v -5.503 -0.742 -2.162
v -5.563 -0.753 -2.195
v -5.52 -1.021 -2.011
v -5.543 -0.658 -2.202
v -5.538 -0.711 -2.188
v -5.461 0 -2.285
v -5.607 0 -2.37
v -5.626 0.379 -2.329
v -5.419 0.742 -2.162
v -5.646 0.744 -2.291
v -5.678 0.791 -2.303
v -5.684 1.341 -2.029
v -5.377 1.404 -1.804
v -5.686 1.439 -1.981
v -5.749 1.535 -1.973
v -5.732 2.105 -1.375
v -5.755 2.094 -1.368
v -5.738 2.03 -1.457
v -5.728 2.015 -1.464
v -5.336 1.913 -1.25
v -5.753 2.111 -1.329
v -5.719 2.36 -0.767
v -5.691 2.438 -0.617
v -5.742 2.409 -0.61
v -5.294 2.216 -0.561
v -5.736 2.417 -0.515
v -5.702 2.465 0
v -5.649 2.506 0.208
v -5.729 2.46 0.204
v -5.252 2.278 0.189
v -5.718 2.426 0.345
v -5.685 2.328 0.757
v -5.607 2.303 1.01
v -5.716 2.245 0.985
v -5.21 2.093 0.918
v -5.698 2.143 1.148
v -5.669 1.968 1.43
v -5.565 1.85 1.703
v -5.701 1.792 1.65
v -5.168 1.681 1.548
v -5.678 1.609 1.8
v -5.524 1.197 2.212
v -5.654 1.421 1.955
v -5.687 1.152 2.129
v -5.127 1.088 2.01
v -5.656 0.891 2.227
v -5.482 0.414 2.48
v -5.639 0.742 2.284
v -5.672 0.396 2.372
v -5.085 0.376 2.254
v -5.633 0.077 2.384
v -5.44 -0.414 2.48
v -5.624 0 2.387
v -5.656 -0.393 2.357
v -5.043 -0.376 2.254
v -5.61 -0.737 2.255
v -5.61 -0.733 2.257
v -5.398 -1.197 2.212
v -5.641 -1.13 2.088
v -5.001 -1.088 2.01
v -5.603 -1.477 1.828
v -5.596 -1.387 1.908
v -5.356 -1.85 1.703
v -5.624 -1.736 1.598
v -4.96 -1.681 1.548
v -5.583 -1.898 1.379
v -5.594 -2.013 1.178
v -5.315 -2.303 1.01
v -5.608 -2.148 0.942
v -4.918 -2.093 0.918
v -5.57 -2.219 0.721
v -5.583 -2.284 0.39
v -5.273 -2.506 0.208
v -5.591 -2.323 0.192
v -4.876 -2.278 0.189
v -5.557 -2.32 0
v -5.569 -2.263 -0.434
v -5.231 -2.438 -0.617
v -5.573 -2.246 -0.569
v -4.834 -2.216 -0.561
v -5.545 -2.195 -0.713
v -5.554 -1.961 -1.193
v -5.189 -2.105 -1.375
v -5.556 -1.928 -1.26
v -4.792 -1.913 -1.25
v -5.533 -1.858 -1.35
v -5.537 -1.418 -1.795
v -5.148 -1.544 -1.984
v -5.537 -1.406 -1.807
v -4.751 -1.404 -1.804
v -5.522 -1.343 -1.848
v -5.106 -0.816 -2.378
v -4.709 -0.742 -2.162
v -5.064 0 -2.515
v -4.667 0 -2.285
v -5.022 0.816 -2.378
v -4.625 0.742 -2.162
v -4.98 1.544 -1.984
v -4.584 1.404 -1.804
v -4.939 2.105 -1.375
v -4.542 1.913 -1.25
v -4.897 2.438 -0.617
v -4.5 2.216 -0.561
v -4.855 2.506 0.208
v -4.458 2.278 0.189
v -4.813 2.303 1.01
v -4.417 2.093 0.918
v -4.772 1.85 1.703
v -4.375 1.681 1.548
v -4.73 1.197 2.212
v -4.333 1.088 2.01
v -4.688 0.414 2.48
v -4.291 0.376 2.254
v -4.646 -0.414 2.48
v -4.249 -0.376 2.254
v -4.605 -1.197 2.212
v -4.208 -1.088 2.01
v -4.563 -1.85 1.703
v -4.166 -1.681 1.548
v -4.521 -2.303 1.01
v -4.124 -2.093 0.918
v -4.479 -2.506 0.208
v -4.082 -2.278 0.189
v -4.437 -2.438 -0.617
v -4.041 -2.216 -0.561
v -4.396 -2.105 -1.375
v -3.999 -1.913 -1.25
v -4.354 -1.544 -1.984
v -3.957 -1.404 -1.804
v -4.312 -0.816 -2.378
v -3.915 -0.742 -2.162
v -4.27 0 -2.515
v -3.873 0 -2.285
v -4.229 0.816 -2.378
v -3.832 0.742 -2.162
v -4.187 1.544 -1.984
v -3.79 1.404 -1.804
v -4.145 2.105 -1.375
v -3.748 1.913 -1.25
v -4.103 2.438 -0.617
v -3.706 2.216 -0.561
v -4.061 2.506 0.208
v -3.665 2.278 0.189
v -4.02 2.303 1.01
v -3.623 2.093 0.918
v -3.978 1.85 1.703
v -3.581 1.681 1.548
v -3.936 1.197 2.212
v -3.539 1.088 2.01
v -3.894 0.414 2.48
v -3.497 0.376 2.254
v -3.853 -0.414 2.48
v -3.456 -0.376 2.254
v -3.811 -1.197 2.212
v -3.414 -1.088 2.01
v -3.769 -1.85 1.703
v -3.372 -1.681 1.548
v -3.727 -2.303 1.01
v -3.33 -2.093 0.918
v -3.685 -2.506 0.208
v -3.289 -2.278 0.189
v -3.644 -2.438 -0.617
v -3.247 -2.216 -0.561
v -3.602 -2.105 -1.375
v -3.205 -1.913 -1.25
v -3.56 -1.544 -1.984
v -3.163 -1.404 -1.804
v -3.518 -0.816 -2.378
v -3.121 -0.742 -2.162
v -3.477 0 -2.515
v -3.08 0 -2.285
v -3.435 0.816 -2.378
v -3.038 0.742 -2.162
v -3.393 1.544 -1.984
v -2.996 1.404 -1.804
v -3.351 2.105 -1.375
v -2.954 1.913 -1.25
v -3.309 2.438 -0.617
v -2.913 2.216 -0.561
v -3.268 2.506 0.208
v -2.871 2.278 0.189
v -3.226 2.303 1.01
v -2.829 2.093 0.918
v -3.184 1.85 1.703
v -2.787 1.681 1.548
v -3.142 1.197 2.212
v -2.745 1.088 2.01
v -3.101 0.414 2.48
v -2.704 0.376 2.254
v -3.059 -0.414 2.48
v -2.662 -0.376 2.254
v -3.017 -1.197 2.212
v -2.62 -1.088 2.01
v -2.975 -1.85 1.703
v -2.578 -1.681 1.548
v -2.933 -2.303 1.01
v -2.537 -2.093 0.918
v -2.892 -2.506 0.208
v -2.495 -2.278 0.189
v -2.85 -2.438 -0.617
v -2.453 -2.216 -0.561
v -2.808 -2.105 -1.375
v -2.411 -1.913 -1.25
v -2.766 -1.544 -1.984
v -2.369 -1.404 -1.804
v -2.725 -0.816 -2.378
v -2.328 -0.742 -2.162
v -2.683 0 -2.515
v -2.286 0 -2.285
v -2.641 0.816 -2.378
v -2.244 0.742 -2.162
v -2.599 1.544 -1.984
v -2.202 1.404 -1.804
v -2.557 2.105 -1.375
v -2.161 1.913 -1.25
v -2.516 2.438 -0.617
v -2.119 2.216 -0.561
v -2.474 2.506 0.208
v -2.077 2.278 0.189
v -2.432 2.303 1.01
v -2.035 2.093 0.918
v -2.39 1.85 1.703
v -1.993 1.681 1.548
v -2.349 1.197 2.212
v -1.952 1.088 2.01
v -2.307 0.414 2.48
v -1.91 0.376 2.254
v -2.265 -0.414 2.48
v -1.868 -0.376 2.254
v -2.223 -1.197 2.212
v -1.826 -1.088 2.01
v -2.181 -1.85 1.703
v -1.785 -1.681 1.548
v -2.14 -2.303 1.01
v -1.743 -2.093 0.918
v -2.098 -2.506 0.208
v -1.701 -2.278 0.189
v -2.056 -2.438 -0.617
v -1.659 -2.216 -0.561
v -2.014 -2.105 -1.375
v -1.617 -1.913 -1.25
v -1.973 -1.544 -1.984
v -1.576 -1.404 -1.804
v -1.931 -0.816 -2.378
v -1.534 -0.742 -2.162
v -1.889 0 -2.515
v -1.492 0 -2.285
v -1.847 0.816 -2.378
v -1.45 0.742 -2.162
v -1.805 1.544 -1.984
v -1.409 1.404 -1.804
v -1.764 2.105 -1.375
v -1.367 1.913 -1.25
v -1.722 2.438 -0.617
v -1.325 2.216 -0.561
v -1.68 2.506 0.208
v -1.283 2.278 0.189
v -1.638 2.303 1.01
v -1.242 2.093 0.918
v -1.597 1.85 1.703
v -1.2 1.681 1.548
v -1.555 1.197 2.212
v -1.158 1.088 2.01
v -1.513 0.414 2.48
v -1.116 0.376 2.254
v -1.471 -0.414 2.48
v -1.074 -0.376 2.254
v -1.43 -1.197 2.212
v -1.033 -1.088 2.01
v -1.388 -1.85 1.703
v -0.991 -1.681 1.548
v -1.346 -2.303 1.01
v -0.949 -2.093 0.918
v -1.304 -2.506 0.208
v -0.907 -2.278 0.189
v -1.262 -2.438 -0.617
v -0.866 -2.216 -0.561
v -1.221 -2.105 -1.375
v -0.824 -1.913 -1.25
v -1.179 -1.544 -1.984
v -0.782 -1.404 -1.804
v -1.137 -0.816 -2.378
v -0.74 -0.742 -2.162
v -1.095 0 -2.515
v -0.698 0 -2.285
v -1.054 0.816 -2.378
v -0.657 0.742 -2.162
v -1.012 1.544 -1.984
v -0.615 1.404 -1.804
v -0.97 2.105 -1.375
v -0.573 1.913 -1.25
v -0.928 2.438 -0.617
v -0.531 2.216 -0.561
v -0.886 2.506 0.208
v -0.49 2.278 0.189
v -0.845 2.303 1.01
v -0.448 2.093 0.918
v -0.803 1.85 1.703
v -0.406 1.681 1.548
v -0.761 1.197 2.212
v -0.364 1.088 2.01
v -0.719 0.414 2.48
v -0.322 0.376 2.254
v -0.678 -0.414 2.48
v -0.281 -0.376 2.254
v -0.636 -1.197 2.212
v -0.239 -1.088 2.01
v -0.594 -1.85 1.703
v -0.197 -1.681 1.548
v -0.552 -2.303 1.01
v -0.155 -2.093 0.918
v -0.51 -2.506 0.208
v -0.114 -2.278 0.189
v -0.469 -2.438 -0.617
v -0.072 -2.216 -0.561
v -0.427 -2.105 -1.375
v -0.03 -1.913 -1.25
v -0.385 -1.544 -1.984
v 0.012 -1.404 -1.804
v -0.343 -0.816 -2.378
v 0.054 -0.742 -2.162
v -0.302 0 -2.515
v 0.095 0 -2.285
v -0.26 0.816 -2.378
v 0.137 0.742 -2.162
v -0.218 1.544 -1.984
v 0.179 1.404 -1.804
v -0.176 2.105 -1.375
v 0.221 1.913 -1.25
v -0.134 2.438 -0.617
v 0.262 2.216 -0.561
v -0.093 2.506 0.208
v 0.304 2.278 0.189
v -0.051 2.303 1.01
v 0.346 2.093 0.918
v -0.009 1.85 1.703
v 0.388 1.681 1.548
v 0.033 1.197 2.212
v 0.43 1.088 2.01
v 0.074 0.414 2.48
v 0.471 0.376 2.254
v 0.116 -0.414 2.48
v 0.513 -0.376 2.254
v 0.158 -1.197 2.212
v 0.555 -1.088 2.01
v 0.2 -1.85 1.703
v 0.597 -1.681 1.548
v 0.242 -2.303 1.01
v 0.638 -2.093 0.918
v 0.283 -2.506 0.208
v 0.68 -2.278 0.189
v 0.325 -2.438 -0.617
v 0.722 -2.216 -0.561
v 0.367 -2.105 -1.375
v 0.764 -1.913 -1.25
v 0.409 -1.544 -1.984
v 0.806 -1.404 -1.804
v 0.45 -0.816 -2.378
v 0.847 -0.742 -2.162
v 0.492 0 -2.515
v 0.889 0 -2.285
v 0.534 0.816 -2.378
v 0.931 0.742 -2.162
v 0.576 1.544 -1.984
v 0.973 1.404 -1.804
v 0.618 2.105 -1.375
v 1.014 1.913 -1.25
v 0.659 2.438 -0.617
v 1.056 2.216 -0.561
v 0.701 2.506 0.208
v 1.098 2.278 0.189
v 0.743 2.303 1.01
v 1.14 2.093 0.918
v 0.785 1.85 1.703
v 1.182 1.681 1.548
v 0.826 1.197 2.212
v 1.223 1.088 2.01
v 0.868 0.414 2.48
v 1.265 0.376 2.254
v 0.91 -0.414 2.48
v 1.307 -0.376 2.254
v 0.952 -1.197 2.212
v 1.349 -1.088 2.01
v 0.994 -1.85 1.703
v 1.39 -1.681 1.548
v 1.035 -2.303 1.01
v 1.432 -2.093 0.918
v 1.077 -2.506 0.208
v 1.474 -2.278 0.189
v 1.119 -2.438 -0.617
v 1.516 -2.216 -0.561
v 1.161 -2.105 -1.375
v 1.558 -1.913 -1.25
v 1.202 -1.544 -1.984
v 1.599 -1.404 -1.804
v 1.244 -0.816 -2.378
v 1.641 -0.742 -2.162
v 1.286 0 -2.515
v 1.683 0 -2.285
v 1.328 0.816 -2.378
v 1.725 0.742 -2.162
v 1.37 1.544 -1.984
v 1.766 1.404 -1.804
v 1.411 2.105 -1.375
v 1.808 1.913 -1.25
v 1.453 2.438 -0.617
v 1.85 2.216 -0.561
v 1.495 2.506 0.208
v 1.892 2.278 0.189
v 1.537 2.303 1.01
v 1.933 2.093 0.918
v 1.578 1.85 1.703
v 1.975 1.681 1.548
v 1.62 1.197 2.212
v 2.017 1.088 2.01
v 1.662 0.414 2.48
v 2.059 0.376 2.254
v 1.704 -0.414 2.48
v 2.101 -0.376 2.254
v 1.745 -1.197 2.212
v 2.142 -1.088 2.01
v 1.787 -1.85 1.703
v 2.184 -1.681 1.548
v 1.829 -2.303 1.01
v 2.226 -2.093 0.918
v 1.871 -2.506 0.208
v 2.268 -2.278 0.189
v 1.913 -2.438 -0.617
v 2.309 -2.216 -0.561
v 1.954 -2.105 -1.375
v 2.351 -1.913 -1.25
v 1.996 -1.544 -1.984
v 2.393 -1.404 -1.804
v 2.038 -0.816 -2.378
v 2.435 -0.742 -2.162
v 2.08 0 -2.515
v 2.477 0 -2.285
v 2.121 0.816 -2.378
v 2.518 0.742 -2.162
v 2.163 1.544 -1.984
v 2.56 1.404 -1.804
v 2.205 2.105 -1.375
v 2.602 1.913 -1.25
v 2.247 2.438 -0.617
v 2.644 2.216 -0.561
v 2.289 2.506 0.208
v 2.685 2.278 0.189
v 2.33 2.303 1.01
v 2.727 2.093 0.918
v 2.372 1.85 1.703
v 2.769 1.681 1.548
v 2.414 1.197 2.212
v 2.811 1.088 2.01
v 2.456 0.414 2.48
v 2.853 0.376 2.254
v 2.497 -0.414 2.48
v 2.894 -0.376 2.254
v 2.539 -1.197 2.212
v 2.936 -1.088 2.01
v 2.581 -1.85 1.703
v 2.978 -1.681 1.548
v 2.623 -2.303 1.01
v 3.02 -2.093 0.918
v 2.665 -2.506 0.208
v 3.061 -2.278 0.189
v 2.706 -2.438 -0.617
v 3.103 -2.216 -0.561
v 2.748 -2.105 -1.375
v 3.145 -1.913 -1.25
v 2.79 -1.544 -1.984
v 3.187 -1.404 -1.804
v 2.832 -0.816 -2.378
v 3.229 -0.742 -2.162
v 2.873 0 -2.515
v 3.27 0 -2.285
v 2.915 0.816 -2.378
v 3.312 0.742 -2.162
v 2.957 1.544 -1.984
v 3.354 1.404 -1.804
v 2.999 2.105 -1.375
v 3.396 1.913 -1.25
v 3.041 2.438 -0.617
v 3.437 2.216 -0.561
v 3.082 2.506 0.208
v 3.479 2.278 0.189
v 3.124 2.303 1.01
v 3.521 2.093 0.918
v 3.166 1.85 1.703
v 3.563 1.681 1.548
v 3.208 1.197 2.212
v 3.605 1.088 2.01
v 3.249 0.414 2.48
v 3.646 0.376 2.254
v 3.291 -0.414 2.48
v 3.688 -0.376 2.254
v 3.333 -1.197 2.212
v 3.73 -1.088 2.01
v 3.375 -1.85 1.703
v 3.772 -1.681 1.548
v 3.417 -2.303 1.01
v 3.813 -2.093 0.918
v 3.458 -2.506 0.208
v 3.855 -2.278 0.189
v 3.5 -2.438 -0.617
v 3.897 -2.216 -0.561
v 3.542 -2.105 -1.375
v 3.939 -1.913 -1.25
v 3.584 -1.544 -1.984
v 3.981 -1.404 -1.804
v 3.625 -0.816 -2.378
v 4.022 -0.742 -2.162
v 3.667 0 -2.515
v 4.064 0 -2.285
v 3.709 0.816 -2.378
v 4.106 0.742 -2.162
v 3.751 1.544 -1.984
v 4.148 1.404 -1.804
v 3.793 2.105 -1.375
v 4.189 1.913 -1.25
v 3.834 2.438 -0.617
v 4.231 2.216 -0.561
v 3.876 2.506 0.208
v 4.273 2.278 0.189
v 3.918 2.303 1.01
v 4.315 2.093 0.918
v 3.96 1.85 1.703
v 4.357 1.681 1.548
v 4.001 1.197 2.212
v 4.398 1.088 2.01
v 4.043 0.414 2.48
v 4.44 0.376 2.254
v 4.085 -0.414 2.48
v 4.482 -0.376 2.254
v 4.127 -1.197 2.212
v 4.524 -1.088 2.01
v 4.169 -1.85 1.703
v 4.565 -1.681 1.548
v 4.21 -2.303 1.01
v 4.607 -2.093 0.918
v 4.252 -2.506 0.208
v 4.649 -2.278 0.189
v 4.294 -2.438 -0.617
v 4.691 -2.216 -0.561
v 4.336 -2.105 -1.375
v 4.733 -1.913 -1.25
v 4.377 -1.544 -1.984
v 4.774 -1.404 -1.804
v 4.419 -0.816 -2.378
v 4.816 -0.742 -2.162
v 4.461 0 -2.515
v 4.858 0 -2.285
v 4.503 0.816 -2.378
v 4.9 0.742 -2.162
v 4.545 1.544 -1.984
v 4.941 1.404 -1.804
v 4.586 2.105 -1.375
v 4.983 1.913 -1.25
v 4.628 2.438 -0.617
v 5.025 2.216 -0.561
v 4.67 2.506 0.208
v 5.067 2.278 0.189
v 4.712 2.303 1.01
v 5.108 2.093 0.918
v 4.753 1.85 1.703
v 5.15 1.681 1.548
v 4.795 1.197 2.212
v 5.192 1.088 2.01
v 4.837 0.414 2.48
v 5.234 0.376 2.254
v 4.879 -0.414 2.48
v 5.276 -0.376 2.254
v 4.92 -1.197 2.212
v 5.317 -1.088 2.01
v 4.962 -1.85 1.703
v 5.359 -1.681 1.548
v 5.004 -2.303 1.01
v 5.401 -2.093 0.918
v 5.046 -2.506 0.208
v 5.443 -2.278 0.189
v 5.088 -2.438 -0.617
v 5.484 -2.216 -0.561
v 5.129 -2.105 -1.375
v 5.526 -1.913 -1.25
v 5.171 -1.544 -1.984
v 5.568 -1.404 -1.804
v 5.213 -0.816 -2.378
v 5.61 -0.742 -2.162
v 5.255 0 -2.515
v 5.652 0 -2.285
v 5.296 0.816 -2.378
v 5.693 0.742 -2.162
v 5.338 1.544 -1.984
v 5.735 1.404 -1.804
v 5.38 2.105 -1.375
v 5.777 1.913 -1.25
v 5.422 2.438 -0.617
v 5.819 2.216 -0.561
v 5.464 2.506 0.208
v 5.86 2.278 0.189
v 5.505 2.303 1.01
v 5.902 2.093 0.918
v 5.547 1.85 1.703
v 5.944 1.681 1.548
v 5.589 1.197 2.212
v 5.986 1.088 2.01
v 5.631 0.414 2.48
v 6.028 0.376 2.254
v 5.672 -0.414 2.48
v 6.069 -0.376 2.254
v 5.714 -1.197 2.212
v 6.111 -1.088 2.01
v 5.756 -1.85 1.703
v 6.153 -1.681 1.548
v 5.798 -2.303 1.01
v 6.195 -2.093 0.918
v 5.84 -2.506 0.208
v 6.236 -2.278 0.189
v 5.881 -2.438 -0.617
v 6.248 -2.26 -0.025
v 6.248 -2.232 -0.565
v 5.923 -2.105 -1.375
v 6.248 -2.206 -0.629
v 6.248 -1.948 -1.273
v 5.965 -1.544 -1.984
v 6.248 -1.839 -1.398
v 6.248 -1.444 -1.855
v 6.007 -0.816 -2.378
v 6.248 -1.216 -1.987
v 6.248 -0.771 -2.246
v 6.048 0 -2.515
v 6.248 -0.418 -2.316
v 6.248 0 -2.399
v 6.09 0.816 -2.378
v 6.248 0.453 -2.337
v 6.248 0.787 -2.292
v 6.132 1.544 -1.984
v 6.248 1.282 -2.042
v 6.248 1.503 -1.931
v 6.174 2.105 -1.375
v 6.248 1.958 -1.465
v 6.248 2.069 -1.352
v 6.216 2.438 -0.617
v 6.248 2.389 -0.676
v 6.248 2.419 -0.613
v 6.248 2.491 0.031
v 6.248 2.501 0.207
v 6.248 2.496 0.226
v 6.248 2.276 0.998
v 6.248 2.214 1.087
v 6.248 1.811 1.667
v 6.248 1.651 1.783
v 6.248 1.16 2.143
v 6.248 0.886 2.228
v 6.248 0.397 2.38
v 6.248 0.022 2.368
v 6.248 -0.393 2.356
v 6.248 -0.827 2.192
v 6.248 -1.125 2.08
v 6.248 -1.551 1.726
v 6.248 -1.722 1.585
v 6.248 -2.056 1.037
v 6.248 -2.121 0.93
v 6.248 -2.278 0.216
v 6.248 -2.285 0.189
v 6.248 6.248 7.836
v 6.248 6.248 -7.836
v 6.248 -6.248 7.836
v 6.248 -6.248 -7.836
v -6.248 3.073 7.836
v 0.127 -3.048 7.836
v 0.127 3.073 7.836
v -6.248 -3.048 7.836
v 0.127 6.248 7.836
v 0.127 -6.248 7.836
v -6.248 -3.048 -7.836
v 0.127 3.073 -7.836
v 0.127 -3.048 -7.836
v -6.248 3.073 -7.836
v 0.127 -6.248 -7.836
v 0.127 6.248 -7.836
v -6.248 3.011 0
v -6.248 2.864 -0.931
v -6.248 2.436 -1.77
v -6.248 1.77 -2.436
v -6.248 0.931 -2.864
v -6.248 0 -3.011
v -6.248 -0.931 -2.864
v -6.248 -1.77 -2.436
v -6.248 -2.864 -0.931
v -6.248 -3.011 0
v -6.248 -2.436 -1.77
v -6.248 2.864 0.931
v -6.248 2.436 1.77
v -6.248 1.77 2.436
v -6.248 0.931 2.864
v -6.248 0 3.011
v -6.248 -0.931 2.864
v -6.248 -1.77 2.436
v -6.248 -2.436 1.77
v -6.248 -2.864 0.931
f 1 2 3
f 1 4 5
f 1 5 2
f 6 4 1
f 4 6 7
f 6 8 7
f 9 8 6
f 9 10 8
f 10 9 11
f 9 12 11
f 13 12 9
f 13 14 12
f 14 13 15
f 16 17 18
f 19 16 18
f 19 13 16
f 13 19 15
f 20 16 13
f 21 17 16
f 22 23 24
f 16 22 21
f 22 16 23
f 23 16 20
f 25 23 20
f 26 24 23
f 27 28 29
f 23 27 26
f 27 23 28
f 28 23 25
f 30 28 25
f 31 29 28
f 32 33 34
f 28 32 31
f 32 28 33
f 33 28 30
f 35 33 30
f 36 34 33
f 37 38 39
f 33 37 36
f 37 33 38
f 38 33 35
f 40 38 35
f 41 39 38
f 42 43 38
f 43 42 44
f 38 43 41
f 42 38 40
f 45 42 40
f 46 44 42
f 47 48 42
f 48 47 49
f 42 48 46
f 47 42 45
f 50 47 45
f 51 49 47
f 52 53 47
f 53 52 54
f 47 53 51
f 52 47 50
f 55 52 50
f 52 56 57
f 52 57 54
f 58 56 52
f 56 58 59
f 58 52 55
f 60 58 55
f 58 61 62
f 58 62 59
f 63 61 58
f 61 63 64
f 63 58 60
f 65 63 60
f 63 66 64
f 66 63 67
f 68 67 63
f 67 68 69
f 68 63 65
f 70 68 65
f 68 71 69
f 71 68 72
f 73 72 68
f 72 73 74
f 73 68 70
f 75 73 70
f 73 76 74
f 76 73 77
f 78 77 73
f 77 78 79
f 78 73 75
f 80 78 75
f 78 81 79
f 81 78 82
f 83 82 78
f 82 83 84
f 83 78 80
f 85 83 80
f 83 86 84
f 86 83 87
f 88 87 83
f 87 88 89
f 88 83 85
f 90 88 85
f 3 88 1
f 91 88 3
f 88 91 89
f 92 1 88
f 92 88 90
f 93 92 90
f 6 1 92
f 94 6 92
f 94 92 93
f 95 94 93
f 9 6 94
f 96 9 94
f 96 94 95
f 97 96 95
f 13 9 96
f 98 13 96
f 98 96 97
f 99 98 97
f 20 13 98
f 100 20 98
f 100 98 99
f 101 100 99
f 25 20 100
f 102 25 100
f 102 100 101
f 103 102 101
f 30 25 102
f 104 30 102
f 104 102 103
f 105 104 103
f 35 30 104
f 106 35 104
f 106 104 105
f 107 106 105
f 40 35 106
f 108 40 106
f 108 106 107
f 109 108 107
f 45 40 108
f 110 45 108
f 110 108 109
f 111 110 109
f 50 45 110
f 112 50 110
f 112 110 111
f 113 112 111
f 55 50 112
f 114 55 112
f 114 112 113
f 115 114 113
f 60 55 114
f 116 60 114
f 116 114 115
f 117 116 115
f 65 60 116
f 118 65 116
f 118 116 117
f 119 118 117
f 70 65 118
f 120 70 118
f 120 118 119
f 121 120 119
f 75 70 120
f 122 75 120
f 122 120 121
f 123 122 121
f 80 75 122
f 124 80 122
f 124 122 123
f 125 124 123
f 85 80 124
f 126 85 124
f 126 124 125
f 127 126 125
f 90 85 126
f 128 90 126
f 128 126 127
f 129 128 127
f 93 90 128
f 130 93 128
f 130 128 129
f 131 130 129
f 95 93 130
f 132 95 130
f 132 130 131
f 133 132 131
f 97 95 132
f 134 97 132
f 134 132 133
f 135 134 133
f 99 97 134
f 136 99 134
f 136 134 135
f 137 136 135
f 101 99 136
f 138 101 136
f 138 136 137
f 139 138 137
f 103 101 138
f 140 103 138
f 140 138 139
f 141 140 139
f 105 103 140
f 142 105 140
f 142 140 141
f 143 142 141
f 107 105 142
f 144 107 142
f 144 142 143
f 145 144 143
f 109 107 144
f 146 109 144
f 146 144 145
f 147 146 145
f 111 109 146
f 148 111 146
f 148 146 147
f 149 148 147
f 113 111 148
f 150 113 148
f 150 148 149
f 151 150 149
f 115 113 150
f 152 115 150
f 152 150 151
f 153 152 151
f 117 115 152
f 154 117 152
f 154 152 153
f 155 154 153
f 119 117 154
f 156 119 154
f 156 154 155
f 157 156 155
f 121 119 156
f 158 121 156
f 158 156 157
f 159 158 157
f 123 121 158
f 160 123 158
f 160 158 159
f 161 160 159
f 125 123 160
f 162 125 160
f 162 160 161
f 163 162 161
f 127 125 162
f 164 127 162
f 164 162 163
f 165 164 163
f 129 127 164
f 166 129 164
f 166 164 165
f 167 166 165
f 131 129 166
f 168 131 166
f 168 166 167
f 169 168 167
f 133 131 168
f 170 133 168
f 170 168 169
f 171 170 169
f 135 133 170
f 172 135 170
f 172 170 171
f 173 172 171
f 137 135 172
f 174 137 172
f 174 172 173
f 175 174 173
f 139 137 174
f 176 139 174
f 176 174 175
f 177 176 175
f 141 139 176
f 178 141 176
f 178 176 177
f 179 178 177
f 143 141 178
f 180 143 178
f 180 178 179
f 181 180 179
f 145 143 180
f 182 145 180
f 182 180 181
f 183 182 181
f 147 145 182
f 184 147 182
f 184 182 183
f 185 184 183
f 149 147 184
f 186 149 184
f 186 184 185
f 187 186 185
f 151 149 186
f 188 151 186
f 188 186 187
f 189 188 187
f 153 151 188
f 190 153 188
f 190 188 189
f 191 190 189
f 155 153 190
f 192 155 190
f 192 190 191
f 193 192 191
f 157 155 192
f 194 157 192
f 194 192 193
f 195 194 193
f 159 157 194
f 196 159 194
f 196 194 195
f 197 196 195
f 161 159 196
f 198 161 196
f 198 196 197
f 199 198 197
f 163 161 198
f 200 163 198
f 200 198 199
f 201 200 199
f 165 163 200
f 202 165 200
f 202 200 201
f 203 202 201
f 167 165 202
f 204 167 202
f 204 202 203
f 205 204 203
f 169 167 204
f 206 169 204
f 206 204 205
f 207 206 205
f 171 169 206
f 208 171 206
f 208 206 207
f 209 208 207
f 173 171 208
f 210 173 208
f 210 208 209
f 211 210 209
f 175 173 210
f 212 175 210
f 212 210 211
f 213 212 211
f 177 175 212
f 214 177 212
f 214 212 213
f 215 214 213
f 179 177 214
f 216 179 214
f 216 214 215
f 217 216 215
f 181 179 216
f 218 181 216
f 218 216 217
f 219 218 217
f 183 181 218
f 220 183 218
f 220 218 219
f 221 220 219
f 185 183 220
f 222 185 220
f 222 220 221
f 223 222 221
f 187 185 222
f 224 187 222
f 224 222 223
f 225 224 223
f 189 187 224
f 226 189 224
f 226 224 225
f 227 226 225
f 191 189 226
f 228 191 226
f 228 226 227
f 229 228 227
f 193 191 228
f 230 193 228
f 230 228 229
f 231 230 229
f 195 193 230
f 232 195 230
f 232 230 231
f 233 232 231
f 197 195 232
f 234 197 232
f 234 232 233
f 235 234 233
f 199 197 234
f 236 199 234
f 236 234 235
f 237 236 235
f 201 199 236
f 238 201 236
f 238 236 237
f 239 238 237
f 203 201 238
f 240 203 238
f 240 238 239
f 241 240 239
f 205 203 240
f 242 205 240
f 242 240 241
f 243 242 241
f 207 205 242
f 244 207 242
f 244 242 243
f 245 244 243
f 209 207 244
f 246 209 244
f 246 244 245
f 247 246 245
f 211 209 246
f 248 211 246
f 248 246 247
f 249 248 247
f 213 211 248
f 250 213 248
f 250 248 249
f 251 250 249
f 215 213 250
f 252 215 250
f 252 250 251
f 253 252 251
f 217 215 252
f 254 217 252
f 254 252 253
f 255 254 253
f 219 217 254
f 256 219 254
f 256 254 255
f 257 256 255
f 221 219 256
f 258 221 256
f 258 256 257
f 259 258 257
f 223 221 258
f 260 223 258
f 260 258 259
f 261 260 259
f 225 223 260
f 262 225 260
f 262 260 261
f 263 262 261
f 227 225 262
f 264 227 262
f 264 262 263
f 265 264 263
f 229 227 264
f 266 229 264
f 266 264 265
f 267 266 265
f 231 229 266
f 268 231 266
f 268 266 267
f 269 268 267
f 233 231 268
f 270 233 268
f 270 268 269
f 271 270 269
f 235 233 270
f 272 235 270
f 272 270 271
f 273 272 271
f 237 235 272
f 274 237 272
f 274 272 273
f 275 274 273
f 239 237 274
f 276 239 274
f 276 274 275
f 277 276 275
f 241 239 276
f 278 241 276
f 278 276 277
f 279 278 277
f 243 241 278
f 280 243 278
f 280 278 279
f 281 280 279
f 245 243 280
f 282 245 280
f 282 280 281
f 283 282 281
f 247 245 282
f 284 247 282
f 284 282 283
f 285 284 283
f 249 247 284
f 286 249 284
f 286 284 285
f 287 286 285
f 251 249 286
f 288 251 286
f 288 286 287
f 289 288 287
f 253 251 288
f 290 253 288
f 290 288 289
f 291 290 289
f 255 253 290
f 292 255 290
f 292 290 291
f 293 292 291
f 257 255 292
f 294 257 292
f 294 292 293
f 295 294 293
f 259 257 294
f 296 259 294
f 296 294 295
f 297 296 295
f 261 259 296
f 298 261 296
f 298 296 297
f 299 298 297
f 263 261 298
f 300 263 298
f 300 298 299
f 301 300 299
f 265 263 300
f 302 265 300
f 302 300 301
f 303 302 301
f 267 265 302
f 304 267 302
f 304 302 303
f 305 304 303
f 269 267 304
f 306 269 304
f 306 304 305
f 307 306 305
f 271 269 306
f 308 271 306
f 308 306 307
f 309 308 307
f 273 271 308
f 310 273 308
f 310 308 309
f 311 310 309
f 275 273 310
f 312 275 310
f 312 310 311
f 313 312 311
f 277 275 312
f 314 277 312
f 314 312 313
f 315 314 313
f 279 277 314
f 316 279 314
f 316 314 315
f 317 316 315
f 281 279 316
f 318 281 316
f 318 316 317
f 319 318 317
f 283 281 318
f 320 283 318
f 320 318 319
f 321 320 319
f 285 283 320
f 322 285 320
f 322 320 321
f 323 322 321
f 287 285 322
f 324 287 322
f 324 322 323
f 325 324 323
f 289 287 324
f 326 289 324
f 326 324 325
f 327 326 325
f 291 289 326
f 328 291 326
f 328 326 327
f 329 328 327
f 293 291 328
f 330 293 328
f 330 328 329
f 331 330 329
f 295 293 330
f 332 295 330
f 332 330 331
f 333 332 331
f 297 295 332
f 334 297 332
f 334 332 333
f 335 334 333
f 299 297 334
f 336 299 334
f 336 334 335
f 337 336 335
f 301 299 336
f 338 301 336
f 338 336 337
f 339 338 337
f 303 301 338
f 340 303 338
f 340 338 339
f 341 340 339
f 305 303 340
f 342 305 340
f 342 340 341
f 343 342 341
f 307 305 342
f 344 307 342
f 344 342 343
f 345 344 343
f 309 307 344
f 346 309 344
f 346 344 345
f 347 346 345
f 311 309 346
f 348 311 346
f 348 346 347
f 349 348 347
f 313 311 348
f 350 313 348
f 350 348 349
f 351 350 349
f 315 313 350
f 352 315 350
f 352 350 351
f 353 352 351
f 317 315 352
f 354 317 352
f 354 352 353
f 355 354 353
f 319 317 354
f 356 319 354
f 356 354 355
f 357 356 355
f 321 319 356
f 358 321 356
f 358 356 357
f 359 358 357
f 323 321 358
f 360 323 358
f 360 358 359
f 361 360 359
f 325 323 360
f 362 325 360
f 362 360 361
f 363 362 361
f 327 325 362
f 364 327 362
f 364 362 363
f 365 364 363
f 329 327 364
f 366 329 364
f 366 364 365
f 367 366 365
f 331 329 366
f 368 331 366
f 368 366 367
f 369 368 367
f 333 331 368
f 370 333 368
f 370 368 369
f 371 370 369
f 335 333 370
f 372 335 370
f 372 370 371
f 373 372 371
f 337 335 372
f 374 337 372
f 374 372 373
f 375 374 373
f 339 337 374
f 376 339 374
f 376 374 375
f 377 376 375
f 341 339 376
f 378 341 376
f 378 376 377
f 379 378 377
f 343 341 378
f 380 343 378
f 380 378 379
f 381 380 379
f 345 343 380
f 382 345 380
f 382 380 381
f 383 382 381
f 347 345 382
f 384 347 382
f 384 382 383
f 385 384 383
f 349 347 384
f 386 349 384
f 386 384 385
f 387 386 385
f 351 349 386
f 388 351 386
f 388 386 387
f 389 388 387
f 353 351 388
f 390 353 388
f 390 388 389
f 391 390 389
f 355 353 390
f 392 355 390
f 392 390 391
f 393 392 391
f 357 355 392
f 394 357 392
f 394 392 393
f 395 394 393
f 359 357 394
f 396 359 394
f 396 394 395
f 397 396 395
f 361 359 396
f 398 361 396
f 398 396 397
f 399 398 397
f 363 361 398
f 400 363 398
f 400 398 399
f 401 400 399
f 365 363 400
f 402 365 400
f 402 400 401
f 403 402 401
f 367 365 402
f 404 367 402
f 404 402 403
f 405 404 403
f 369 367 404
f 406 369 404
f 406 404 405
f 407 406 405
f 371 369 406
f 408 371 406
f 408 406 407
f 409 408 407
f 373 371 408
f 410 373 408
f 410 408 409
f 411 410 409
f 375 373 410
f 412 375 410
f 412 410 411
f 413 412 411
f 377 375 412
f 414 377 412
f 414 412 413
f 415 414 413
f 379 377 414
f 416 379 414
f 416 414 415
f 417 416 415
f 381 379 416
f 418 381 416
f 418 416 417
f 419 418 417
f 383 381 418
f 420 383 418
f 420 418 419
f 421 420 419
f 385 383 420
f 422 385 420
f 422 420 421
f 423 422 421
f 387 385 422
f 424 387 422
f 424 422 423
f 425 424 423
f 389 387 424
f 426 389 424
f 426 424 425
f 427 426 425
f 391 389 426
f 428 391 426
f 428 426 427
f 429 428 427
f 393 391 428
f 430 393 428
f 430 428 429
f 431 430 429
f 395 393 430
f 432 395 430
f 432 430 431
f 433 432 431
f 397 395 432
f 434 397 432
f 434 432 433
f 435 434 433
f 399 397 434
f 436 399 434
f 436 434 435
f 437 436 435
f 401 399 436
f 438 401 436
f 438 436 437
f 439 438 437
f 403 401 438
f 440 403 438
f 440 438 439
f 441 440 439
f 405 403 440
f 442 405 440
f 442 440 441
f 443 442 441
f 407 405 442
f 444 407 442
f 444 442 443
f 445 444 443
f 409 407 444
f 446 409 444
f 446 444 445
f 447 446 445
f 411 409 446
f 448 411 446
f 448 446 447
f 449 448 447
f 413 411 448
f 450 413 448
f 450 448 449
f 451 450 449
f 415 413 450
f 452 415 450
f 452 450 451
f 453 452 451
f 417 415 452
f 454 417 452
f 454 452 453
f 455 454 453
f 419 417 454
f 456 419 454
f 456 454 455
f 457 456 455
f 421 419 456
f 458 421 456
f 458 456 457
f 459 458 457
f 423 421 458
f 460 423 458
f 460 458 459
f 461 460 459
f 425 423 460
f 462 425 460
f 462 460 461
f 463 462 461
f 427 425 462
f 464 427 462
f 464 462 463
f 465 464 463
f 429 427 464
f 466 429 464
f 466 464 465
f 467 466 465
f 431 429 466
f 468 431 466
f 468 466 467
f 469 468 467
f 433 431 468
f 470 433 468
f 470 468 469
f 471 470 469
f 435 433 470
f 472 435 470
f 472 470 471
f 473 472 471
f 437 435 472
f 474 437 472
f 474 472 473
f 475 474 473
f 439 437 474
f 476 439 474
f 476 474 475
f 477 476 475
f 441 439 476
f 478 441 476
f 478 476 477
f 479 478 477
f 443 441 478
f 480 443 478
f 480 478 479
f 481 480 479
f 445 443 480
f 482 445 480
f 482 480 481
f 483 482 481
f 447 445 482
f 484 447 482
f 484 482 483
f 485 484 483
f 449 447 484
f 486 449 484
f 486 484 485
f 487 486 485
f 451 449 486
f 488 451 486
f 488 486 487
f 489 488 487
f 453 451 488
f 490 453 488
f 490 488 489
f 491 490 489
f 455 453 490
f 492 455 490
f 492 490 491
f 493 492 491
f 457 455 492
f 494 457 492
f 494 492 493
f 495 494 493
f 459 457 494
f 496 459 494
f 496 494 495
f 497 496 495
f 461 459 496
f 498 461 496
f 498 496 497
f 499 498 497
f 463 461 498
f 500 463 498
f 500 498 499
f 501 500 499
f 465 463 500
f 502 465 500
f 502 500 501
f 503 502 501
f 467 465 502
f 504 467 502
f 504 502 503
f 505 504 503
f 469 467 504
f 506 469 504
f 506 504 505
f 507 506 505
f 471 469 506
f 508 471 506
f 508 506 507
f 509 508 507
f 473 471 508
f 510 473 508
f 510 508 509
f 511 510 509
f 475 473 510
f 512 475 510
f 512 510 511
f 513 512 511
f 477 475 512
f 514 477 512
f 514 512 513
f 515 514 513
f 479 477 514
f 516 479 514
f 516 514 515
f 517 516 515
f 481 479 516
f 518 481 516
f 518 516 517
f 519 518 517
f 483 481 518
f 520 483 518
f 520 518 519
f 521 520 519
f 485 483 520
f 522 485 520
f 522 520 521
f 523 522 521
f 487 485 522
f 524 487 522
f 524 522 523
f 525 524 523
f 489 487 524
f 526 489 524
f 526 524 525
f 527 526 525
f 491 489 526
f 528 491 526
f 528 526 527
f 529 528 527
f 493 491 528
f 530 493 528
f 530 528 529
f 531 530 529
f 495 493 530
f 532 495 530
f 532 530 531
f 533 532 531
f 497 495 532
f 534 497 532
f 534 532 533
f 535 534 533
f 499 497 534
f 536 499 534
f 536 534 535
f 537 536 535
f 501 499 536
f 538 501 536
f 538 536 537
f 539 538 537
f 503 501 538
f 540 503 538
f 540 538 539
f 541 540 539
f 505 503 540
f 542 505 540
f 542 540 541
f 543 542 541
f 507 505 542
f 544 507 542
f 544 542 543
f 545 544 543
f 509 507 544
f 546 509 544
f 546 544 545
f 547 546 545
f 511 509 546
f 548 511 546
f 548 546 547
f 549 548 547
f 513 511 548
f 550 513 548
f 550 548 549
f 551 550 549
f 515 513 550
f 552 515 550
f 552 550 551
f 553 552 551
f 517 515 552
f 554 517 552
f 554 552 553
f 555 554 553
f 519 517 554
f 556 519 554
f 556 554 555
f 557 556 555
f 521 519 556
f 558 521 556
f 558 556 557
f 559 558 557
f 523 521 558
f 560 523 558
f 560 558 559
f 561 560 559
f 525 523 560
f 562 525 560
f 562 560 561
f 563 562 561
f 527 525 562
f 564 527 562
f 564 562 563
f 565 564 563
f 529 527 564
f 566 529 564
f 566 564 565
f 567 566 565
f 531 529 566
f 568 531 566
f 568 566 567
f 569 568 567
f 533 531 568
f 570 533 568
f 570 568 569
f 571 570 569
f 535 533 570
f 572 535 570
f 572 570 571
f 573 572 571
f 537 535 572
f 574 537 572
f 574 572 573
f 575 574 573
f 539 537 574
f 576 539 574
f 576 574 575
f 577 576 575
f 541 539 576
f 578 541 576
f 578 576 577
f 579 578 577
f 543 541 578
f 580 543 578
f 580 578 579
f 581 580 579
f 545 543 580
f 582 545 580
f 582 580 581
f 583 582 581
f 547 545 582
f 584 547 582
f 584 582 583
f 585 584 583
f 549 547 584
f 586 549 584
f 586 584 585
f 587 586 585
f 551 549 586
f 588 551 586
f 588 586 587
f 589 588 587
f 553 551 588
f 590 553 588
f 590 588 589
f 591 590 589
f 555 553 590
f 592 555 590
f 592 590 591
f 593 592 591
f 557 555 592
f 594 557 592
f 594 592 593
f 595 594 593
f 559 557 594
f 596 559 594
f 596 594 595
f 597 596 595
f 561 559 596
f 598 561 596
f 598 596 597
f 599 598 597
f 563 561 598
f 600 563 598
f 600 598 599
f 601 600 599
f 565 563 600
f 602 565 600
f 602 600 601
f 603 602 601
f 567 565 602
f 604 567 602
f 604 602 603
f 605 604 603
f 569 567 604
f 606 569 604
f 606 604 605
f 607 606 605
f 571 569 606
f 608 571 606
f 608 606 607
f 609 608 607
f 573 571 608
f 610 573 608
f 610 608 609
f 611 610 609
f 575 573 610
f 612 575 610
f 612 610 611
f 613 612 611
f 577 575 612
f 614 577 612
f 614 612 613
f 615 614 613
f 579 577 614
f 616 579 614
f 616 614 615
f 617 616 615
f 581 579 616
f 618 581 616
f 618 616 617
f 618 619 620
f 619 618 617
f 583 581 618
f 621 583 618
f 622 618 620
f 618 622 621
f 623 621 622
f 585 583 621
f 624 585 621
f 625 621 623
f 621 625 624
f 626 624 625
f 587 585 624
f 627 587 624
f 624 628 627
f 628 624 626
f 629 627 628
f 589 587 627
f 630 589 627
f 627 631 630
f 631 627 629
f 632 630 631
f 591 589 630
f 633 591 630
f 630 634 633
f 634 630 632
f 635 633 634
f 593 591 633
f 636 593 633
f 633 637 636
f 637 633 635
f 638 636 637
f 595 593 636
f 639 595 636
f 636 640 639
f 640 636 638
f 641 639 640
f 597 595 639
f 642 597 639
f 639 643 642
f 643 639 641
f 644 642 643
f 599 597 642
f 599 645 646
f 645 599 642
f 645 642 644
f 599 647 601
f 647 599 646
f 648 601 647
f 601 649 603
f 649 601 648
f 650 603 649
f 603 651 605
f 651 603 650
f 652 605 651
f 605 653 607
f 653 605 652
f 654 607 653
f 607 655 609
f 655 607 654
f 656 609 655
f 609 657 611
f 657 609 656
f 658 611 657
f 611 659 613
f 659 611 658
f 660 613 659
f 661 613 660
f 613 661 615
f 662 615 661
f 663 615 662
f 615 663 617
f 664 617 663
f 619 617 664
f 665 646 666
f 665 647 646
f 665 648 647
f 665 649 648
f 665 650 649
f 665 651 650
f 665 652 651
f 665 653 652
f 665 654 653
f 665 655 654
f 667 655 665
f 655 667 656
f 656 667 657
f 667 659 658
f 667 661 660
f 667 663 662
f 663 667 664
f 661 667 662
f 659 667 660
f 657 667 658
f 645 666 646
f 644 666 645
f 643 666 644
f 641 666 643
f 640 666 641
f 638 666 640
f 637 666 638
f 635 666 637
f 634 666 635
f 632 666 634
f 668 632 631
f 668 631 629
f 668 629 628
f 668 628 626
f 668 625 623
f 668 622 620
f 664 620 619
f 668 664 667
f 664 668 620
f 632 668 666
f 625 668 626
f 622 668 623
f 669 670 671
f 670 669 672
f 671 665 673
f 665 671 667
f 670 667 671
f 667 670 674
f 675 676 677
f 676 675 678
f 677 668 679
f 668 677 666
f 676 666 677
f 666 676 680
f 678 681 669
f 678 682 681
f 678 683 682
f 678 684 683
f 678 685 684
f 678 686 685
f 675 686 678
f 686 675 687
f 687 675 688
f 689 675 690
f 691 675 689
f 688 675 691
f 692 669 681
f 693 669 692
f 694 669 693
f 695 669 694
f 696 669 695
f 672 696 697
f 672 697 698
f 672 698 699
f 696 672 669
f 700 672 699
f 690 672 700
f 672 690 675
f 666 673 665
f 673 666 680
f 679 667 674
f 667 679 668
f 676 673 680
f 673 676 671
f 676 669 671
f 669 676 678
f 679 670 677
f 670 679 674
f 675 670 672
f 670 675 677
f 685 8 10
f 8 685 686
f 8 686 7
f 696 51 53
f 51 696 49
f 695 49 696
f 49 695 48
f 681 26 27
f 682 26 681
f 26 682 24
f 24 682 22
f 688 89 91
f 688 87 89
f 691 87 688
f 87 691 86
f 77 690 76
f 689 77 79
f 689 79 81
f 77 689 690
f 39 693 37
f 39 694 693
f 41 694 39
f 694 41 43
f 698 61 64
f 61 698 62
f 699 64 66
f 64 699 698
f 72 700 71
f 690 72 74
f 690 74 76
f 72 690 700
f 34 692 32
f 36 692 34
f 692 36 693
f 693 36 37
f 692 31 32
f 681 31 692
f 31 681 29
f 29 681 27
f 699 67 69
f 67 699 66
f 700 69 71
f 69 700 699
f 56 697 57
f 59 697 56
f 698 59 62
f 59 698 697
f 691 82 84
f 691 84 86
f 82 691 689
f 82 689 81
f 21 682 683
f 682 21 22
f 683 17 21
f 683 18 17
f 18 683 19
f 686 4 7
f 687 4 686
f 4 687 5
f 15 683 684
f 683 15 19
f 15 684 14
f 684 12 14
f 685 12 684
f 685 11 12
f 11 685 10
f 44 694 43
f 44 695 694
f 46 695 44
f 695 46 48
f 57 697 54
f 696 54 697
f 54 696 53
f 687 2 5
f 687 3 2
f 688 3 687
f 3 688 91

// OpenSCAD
//Customizable t-nut v1 by Eric Monkman
//January 2014

// Several modules from aubenc's threaded fastener library (polyScrewThread_r1.scad at http://www.thingiverse.com/thing:8796) are used to generate the threaded hole.
// CC Public Domain

//CUSTOMIZER VARIABLES

// Total length of t-nut.
l = 0.625;

// Total height of t-nut.
h = 0.5;

// Total width of t-nut.
w = 0.5;

// Height of the narrow part of t-nut.
hm = 0.25;

// Width of the narrow part of t-nut.
wm = 0.25;

// Major diameter of thread.
thread_d = 0.19;

// Pitch of thread in threads-per-inch
thread_p = 32;

// Set a tolerance value to account for finite thickness of plastic strands
tolerance = 0.008;

//CUSTOMIZER VARIABLES END

// Rescale the t-nut so that output is in mm for 3D printing
scale([25.4,25.4,25.4]) tnut(h-tolerance,w-tolerance,l-tolerance,hm,wm-tolerance,thread_d+tolerance,thread_p);


module tnut(h,w,l,hm,wm,thread_d,thread_p)
{
////////////////////////////
// All input in inches, pitch in threads-per-inch (sorry rest of the world...).
// h, w, l: the total height, width and length of the t-nut.
// hm and wm: the dimensions  of the narrow part of the t-nut.
// thread_d, thread_p: the major diameter and pitch of the threaded hole.
////////////////////////////
$fn = 20;

	difference(){
		// Draw basic t-nut shape
		translate([-h/2,-w/2,-l/2]) cube([h,w,l]);
		translate([-h/2,wm/2,-l/2]) cube([hm+0.001,((w-wm)/2)+0.001,l+0.001]);
		translate([-h/2,-w/2,-l/2]) cube([hm+0.001,((w-wm)/2)+0.001,l+0.001]);

		//Chamfer the hole
		translate([-h/2*1.001,0,0]) rotate([0,90,0]) cylinder(h=thread_d*1.2/2,r1=thread_d*1.2/2,r2=0);

		//Thread the hole using aubenc's Library.
		translate([-h/2*1.001,0,0]) rotate([0,90,0]) screw_thread(thread_d,1/thread_p,60,h*1.1,PI/100,1);

	}
}



///////////////////////////////
// Start of aubenc's library //
///////////////////////////////
module screw_thread(od,st,lf0,lt,rs,cs)
{
    or=od/2;
    ir=or-st/2*cos(lf0)/sin(lf0);
    pf=2*PI*or;
    sn=floor(pf/rs);
    lfxy=360/sn;
    ttn=round(lt/st+1);
    zt=st/sn;

    intersection()
    {
        if (cs >= -1)
        {
           thread_shape(cs,lt,or,ir,sn,st);
        }

        full_thread(ttn,st,sn,zt,lfxy,or,ir);
    }
}

module thread_shape(cs,lt,or,ir,sn,st)
{
    if ( cs == 0 )
    {
        cylinder(h=lt, r=or, $fn=sn, center=false);
    }
    else
    {
        union()
        {
            translate([0,0,st/2])
              cylinder(h=lt-st+0.005, r=or, $fn=sn, center=false);

            if ( cs == -1 || cs == 2 )
            {
                cylinder(h=st/2, r1=ir, r2=or, $fn=sn, center=false);
            }
            else
            {
                cylinder(h=st/2, r=or, $fn=sn, center=false);
            }

            translate([0,0,lt-st/2])
            if ( cs == 1 || cs == 2 )
            {
                  cylinder(h=st/2, r1=or, r2=ir, $fn=sn, center=false);
            }
            else
            {
                cylinder(h=st/2, r=or, $fn=sn, center=false);
            }
        }
    }
}



module full_thread(ttn,st,sn,zt,lfxy,or,ir)
{
  if(ir >= 0.01)
  {
    for(i=[0:ttn-1])
    {
        for(j=[0:sn-1])
			assign( pt = [	[0,                  0,                  i*st-st            ],
                        [ir*cos(j*lfxy),     ir*sin(j*lfxy),     i*st+j*zt-st       ],
                        [ir*cos((j+1)*lfxy), ir*sin((j+1)*lfxy), i*st+(j+1)*zt-st   ],
								[0,0,i*st],
                        [or*cos(j*lfxy),     or*sin(j*lfxy),     i*st+j*zt-st/2     ],
                        [or*cos((j+1)*lfxy), or*sin((j+1)*lfxy), i*st+(j+1)*zt-st/2 ],
                        [ir*cos(j*lfxy),     ir*sin(j*lfxy),     i*st+j*zt          ],
                        [ir*cos((j+1)*lfxy), ir*sin((j+1)*lfxy), i*st+(j+1)*zt      ],
                        [0,                  0,                  i*st+st            ]	])
        {
            polyhedron(points=pt,
              		  triangles=[	[1,0,3],[1,3,6],[6,3,8],[1,6,4],
											[0,1,2],[1,4,2],[2,4,5],[5,4,6],[5,6,7],[7,6,8],
											[7,8,3],[0,2,3],[3,2,7],[7,2,5]	]);
        }
    }
  }
  else
  {
    echo("Step Degrees too agresive, the thread will not be made!!");
    echo("Try to increase de value for the degrees and/or...");
    echo(" decrease the pitch value and/or...");
    echo(" increase the outer diameter value.");
  }
}
